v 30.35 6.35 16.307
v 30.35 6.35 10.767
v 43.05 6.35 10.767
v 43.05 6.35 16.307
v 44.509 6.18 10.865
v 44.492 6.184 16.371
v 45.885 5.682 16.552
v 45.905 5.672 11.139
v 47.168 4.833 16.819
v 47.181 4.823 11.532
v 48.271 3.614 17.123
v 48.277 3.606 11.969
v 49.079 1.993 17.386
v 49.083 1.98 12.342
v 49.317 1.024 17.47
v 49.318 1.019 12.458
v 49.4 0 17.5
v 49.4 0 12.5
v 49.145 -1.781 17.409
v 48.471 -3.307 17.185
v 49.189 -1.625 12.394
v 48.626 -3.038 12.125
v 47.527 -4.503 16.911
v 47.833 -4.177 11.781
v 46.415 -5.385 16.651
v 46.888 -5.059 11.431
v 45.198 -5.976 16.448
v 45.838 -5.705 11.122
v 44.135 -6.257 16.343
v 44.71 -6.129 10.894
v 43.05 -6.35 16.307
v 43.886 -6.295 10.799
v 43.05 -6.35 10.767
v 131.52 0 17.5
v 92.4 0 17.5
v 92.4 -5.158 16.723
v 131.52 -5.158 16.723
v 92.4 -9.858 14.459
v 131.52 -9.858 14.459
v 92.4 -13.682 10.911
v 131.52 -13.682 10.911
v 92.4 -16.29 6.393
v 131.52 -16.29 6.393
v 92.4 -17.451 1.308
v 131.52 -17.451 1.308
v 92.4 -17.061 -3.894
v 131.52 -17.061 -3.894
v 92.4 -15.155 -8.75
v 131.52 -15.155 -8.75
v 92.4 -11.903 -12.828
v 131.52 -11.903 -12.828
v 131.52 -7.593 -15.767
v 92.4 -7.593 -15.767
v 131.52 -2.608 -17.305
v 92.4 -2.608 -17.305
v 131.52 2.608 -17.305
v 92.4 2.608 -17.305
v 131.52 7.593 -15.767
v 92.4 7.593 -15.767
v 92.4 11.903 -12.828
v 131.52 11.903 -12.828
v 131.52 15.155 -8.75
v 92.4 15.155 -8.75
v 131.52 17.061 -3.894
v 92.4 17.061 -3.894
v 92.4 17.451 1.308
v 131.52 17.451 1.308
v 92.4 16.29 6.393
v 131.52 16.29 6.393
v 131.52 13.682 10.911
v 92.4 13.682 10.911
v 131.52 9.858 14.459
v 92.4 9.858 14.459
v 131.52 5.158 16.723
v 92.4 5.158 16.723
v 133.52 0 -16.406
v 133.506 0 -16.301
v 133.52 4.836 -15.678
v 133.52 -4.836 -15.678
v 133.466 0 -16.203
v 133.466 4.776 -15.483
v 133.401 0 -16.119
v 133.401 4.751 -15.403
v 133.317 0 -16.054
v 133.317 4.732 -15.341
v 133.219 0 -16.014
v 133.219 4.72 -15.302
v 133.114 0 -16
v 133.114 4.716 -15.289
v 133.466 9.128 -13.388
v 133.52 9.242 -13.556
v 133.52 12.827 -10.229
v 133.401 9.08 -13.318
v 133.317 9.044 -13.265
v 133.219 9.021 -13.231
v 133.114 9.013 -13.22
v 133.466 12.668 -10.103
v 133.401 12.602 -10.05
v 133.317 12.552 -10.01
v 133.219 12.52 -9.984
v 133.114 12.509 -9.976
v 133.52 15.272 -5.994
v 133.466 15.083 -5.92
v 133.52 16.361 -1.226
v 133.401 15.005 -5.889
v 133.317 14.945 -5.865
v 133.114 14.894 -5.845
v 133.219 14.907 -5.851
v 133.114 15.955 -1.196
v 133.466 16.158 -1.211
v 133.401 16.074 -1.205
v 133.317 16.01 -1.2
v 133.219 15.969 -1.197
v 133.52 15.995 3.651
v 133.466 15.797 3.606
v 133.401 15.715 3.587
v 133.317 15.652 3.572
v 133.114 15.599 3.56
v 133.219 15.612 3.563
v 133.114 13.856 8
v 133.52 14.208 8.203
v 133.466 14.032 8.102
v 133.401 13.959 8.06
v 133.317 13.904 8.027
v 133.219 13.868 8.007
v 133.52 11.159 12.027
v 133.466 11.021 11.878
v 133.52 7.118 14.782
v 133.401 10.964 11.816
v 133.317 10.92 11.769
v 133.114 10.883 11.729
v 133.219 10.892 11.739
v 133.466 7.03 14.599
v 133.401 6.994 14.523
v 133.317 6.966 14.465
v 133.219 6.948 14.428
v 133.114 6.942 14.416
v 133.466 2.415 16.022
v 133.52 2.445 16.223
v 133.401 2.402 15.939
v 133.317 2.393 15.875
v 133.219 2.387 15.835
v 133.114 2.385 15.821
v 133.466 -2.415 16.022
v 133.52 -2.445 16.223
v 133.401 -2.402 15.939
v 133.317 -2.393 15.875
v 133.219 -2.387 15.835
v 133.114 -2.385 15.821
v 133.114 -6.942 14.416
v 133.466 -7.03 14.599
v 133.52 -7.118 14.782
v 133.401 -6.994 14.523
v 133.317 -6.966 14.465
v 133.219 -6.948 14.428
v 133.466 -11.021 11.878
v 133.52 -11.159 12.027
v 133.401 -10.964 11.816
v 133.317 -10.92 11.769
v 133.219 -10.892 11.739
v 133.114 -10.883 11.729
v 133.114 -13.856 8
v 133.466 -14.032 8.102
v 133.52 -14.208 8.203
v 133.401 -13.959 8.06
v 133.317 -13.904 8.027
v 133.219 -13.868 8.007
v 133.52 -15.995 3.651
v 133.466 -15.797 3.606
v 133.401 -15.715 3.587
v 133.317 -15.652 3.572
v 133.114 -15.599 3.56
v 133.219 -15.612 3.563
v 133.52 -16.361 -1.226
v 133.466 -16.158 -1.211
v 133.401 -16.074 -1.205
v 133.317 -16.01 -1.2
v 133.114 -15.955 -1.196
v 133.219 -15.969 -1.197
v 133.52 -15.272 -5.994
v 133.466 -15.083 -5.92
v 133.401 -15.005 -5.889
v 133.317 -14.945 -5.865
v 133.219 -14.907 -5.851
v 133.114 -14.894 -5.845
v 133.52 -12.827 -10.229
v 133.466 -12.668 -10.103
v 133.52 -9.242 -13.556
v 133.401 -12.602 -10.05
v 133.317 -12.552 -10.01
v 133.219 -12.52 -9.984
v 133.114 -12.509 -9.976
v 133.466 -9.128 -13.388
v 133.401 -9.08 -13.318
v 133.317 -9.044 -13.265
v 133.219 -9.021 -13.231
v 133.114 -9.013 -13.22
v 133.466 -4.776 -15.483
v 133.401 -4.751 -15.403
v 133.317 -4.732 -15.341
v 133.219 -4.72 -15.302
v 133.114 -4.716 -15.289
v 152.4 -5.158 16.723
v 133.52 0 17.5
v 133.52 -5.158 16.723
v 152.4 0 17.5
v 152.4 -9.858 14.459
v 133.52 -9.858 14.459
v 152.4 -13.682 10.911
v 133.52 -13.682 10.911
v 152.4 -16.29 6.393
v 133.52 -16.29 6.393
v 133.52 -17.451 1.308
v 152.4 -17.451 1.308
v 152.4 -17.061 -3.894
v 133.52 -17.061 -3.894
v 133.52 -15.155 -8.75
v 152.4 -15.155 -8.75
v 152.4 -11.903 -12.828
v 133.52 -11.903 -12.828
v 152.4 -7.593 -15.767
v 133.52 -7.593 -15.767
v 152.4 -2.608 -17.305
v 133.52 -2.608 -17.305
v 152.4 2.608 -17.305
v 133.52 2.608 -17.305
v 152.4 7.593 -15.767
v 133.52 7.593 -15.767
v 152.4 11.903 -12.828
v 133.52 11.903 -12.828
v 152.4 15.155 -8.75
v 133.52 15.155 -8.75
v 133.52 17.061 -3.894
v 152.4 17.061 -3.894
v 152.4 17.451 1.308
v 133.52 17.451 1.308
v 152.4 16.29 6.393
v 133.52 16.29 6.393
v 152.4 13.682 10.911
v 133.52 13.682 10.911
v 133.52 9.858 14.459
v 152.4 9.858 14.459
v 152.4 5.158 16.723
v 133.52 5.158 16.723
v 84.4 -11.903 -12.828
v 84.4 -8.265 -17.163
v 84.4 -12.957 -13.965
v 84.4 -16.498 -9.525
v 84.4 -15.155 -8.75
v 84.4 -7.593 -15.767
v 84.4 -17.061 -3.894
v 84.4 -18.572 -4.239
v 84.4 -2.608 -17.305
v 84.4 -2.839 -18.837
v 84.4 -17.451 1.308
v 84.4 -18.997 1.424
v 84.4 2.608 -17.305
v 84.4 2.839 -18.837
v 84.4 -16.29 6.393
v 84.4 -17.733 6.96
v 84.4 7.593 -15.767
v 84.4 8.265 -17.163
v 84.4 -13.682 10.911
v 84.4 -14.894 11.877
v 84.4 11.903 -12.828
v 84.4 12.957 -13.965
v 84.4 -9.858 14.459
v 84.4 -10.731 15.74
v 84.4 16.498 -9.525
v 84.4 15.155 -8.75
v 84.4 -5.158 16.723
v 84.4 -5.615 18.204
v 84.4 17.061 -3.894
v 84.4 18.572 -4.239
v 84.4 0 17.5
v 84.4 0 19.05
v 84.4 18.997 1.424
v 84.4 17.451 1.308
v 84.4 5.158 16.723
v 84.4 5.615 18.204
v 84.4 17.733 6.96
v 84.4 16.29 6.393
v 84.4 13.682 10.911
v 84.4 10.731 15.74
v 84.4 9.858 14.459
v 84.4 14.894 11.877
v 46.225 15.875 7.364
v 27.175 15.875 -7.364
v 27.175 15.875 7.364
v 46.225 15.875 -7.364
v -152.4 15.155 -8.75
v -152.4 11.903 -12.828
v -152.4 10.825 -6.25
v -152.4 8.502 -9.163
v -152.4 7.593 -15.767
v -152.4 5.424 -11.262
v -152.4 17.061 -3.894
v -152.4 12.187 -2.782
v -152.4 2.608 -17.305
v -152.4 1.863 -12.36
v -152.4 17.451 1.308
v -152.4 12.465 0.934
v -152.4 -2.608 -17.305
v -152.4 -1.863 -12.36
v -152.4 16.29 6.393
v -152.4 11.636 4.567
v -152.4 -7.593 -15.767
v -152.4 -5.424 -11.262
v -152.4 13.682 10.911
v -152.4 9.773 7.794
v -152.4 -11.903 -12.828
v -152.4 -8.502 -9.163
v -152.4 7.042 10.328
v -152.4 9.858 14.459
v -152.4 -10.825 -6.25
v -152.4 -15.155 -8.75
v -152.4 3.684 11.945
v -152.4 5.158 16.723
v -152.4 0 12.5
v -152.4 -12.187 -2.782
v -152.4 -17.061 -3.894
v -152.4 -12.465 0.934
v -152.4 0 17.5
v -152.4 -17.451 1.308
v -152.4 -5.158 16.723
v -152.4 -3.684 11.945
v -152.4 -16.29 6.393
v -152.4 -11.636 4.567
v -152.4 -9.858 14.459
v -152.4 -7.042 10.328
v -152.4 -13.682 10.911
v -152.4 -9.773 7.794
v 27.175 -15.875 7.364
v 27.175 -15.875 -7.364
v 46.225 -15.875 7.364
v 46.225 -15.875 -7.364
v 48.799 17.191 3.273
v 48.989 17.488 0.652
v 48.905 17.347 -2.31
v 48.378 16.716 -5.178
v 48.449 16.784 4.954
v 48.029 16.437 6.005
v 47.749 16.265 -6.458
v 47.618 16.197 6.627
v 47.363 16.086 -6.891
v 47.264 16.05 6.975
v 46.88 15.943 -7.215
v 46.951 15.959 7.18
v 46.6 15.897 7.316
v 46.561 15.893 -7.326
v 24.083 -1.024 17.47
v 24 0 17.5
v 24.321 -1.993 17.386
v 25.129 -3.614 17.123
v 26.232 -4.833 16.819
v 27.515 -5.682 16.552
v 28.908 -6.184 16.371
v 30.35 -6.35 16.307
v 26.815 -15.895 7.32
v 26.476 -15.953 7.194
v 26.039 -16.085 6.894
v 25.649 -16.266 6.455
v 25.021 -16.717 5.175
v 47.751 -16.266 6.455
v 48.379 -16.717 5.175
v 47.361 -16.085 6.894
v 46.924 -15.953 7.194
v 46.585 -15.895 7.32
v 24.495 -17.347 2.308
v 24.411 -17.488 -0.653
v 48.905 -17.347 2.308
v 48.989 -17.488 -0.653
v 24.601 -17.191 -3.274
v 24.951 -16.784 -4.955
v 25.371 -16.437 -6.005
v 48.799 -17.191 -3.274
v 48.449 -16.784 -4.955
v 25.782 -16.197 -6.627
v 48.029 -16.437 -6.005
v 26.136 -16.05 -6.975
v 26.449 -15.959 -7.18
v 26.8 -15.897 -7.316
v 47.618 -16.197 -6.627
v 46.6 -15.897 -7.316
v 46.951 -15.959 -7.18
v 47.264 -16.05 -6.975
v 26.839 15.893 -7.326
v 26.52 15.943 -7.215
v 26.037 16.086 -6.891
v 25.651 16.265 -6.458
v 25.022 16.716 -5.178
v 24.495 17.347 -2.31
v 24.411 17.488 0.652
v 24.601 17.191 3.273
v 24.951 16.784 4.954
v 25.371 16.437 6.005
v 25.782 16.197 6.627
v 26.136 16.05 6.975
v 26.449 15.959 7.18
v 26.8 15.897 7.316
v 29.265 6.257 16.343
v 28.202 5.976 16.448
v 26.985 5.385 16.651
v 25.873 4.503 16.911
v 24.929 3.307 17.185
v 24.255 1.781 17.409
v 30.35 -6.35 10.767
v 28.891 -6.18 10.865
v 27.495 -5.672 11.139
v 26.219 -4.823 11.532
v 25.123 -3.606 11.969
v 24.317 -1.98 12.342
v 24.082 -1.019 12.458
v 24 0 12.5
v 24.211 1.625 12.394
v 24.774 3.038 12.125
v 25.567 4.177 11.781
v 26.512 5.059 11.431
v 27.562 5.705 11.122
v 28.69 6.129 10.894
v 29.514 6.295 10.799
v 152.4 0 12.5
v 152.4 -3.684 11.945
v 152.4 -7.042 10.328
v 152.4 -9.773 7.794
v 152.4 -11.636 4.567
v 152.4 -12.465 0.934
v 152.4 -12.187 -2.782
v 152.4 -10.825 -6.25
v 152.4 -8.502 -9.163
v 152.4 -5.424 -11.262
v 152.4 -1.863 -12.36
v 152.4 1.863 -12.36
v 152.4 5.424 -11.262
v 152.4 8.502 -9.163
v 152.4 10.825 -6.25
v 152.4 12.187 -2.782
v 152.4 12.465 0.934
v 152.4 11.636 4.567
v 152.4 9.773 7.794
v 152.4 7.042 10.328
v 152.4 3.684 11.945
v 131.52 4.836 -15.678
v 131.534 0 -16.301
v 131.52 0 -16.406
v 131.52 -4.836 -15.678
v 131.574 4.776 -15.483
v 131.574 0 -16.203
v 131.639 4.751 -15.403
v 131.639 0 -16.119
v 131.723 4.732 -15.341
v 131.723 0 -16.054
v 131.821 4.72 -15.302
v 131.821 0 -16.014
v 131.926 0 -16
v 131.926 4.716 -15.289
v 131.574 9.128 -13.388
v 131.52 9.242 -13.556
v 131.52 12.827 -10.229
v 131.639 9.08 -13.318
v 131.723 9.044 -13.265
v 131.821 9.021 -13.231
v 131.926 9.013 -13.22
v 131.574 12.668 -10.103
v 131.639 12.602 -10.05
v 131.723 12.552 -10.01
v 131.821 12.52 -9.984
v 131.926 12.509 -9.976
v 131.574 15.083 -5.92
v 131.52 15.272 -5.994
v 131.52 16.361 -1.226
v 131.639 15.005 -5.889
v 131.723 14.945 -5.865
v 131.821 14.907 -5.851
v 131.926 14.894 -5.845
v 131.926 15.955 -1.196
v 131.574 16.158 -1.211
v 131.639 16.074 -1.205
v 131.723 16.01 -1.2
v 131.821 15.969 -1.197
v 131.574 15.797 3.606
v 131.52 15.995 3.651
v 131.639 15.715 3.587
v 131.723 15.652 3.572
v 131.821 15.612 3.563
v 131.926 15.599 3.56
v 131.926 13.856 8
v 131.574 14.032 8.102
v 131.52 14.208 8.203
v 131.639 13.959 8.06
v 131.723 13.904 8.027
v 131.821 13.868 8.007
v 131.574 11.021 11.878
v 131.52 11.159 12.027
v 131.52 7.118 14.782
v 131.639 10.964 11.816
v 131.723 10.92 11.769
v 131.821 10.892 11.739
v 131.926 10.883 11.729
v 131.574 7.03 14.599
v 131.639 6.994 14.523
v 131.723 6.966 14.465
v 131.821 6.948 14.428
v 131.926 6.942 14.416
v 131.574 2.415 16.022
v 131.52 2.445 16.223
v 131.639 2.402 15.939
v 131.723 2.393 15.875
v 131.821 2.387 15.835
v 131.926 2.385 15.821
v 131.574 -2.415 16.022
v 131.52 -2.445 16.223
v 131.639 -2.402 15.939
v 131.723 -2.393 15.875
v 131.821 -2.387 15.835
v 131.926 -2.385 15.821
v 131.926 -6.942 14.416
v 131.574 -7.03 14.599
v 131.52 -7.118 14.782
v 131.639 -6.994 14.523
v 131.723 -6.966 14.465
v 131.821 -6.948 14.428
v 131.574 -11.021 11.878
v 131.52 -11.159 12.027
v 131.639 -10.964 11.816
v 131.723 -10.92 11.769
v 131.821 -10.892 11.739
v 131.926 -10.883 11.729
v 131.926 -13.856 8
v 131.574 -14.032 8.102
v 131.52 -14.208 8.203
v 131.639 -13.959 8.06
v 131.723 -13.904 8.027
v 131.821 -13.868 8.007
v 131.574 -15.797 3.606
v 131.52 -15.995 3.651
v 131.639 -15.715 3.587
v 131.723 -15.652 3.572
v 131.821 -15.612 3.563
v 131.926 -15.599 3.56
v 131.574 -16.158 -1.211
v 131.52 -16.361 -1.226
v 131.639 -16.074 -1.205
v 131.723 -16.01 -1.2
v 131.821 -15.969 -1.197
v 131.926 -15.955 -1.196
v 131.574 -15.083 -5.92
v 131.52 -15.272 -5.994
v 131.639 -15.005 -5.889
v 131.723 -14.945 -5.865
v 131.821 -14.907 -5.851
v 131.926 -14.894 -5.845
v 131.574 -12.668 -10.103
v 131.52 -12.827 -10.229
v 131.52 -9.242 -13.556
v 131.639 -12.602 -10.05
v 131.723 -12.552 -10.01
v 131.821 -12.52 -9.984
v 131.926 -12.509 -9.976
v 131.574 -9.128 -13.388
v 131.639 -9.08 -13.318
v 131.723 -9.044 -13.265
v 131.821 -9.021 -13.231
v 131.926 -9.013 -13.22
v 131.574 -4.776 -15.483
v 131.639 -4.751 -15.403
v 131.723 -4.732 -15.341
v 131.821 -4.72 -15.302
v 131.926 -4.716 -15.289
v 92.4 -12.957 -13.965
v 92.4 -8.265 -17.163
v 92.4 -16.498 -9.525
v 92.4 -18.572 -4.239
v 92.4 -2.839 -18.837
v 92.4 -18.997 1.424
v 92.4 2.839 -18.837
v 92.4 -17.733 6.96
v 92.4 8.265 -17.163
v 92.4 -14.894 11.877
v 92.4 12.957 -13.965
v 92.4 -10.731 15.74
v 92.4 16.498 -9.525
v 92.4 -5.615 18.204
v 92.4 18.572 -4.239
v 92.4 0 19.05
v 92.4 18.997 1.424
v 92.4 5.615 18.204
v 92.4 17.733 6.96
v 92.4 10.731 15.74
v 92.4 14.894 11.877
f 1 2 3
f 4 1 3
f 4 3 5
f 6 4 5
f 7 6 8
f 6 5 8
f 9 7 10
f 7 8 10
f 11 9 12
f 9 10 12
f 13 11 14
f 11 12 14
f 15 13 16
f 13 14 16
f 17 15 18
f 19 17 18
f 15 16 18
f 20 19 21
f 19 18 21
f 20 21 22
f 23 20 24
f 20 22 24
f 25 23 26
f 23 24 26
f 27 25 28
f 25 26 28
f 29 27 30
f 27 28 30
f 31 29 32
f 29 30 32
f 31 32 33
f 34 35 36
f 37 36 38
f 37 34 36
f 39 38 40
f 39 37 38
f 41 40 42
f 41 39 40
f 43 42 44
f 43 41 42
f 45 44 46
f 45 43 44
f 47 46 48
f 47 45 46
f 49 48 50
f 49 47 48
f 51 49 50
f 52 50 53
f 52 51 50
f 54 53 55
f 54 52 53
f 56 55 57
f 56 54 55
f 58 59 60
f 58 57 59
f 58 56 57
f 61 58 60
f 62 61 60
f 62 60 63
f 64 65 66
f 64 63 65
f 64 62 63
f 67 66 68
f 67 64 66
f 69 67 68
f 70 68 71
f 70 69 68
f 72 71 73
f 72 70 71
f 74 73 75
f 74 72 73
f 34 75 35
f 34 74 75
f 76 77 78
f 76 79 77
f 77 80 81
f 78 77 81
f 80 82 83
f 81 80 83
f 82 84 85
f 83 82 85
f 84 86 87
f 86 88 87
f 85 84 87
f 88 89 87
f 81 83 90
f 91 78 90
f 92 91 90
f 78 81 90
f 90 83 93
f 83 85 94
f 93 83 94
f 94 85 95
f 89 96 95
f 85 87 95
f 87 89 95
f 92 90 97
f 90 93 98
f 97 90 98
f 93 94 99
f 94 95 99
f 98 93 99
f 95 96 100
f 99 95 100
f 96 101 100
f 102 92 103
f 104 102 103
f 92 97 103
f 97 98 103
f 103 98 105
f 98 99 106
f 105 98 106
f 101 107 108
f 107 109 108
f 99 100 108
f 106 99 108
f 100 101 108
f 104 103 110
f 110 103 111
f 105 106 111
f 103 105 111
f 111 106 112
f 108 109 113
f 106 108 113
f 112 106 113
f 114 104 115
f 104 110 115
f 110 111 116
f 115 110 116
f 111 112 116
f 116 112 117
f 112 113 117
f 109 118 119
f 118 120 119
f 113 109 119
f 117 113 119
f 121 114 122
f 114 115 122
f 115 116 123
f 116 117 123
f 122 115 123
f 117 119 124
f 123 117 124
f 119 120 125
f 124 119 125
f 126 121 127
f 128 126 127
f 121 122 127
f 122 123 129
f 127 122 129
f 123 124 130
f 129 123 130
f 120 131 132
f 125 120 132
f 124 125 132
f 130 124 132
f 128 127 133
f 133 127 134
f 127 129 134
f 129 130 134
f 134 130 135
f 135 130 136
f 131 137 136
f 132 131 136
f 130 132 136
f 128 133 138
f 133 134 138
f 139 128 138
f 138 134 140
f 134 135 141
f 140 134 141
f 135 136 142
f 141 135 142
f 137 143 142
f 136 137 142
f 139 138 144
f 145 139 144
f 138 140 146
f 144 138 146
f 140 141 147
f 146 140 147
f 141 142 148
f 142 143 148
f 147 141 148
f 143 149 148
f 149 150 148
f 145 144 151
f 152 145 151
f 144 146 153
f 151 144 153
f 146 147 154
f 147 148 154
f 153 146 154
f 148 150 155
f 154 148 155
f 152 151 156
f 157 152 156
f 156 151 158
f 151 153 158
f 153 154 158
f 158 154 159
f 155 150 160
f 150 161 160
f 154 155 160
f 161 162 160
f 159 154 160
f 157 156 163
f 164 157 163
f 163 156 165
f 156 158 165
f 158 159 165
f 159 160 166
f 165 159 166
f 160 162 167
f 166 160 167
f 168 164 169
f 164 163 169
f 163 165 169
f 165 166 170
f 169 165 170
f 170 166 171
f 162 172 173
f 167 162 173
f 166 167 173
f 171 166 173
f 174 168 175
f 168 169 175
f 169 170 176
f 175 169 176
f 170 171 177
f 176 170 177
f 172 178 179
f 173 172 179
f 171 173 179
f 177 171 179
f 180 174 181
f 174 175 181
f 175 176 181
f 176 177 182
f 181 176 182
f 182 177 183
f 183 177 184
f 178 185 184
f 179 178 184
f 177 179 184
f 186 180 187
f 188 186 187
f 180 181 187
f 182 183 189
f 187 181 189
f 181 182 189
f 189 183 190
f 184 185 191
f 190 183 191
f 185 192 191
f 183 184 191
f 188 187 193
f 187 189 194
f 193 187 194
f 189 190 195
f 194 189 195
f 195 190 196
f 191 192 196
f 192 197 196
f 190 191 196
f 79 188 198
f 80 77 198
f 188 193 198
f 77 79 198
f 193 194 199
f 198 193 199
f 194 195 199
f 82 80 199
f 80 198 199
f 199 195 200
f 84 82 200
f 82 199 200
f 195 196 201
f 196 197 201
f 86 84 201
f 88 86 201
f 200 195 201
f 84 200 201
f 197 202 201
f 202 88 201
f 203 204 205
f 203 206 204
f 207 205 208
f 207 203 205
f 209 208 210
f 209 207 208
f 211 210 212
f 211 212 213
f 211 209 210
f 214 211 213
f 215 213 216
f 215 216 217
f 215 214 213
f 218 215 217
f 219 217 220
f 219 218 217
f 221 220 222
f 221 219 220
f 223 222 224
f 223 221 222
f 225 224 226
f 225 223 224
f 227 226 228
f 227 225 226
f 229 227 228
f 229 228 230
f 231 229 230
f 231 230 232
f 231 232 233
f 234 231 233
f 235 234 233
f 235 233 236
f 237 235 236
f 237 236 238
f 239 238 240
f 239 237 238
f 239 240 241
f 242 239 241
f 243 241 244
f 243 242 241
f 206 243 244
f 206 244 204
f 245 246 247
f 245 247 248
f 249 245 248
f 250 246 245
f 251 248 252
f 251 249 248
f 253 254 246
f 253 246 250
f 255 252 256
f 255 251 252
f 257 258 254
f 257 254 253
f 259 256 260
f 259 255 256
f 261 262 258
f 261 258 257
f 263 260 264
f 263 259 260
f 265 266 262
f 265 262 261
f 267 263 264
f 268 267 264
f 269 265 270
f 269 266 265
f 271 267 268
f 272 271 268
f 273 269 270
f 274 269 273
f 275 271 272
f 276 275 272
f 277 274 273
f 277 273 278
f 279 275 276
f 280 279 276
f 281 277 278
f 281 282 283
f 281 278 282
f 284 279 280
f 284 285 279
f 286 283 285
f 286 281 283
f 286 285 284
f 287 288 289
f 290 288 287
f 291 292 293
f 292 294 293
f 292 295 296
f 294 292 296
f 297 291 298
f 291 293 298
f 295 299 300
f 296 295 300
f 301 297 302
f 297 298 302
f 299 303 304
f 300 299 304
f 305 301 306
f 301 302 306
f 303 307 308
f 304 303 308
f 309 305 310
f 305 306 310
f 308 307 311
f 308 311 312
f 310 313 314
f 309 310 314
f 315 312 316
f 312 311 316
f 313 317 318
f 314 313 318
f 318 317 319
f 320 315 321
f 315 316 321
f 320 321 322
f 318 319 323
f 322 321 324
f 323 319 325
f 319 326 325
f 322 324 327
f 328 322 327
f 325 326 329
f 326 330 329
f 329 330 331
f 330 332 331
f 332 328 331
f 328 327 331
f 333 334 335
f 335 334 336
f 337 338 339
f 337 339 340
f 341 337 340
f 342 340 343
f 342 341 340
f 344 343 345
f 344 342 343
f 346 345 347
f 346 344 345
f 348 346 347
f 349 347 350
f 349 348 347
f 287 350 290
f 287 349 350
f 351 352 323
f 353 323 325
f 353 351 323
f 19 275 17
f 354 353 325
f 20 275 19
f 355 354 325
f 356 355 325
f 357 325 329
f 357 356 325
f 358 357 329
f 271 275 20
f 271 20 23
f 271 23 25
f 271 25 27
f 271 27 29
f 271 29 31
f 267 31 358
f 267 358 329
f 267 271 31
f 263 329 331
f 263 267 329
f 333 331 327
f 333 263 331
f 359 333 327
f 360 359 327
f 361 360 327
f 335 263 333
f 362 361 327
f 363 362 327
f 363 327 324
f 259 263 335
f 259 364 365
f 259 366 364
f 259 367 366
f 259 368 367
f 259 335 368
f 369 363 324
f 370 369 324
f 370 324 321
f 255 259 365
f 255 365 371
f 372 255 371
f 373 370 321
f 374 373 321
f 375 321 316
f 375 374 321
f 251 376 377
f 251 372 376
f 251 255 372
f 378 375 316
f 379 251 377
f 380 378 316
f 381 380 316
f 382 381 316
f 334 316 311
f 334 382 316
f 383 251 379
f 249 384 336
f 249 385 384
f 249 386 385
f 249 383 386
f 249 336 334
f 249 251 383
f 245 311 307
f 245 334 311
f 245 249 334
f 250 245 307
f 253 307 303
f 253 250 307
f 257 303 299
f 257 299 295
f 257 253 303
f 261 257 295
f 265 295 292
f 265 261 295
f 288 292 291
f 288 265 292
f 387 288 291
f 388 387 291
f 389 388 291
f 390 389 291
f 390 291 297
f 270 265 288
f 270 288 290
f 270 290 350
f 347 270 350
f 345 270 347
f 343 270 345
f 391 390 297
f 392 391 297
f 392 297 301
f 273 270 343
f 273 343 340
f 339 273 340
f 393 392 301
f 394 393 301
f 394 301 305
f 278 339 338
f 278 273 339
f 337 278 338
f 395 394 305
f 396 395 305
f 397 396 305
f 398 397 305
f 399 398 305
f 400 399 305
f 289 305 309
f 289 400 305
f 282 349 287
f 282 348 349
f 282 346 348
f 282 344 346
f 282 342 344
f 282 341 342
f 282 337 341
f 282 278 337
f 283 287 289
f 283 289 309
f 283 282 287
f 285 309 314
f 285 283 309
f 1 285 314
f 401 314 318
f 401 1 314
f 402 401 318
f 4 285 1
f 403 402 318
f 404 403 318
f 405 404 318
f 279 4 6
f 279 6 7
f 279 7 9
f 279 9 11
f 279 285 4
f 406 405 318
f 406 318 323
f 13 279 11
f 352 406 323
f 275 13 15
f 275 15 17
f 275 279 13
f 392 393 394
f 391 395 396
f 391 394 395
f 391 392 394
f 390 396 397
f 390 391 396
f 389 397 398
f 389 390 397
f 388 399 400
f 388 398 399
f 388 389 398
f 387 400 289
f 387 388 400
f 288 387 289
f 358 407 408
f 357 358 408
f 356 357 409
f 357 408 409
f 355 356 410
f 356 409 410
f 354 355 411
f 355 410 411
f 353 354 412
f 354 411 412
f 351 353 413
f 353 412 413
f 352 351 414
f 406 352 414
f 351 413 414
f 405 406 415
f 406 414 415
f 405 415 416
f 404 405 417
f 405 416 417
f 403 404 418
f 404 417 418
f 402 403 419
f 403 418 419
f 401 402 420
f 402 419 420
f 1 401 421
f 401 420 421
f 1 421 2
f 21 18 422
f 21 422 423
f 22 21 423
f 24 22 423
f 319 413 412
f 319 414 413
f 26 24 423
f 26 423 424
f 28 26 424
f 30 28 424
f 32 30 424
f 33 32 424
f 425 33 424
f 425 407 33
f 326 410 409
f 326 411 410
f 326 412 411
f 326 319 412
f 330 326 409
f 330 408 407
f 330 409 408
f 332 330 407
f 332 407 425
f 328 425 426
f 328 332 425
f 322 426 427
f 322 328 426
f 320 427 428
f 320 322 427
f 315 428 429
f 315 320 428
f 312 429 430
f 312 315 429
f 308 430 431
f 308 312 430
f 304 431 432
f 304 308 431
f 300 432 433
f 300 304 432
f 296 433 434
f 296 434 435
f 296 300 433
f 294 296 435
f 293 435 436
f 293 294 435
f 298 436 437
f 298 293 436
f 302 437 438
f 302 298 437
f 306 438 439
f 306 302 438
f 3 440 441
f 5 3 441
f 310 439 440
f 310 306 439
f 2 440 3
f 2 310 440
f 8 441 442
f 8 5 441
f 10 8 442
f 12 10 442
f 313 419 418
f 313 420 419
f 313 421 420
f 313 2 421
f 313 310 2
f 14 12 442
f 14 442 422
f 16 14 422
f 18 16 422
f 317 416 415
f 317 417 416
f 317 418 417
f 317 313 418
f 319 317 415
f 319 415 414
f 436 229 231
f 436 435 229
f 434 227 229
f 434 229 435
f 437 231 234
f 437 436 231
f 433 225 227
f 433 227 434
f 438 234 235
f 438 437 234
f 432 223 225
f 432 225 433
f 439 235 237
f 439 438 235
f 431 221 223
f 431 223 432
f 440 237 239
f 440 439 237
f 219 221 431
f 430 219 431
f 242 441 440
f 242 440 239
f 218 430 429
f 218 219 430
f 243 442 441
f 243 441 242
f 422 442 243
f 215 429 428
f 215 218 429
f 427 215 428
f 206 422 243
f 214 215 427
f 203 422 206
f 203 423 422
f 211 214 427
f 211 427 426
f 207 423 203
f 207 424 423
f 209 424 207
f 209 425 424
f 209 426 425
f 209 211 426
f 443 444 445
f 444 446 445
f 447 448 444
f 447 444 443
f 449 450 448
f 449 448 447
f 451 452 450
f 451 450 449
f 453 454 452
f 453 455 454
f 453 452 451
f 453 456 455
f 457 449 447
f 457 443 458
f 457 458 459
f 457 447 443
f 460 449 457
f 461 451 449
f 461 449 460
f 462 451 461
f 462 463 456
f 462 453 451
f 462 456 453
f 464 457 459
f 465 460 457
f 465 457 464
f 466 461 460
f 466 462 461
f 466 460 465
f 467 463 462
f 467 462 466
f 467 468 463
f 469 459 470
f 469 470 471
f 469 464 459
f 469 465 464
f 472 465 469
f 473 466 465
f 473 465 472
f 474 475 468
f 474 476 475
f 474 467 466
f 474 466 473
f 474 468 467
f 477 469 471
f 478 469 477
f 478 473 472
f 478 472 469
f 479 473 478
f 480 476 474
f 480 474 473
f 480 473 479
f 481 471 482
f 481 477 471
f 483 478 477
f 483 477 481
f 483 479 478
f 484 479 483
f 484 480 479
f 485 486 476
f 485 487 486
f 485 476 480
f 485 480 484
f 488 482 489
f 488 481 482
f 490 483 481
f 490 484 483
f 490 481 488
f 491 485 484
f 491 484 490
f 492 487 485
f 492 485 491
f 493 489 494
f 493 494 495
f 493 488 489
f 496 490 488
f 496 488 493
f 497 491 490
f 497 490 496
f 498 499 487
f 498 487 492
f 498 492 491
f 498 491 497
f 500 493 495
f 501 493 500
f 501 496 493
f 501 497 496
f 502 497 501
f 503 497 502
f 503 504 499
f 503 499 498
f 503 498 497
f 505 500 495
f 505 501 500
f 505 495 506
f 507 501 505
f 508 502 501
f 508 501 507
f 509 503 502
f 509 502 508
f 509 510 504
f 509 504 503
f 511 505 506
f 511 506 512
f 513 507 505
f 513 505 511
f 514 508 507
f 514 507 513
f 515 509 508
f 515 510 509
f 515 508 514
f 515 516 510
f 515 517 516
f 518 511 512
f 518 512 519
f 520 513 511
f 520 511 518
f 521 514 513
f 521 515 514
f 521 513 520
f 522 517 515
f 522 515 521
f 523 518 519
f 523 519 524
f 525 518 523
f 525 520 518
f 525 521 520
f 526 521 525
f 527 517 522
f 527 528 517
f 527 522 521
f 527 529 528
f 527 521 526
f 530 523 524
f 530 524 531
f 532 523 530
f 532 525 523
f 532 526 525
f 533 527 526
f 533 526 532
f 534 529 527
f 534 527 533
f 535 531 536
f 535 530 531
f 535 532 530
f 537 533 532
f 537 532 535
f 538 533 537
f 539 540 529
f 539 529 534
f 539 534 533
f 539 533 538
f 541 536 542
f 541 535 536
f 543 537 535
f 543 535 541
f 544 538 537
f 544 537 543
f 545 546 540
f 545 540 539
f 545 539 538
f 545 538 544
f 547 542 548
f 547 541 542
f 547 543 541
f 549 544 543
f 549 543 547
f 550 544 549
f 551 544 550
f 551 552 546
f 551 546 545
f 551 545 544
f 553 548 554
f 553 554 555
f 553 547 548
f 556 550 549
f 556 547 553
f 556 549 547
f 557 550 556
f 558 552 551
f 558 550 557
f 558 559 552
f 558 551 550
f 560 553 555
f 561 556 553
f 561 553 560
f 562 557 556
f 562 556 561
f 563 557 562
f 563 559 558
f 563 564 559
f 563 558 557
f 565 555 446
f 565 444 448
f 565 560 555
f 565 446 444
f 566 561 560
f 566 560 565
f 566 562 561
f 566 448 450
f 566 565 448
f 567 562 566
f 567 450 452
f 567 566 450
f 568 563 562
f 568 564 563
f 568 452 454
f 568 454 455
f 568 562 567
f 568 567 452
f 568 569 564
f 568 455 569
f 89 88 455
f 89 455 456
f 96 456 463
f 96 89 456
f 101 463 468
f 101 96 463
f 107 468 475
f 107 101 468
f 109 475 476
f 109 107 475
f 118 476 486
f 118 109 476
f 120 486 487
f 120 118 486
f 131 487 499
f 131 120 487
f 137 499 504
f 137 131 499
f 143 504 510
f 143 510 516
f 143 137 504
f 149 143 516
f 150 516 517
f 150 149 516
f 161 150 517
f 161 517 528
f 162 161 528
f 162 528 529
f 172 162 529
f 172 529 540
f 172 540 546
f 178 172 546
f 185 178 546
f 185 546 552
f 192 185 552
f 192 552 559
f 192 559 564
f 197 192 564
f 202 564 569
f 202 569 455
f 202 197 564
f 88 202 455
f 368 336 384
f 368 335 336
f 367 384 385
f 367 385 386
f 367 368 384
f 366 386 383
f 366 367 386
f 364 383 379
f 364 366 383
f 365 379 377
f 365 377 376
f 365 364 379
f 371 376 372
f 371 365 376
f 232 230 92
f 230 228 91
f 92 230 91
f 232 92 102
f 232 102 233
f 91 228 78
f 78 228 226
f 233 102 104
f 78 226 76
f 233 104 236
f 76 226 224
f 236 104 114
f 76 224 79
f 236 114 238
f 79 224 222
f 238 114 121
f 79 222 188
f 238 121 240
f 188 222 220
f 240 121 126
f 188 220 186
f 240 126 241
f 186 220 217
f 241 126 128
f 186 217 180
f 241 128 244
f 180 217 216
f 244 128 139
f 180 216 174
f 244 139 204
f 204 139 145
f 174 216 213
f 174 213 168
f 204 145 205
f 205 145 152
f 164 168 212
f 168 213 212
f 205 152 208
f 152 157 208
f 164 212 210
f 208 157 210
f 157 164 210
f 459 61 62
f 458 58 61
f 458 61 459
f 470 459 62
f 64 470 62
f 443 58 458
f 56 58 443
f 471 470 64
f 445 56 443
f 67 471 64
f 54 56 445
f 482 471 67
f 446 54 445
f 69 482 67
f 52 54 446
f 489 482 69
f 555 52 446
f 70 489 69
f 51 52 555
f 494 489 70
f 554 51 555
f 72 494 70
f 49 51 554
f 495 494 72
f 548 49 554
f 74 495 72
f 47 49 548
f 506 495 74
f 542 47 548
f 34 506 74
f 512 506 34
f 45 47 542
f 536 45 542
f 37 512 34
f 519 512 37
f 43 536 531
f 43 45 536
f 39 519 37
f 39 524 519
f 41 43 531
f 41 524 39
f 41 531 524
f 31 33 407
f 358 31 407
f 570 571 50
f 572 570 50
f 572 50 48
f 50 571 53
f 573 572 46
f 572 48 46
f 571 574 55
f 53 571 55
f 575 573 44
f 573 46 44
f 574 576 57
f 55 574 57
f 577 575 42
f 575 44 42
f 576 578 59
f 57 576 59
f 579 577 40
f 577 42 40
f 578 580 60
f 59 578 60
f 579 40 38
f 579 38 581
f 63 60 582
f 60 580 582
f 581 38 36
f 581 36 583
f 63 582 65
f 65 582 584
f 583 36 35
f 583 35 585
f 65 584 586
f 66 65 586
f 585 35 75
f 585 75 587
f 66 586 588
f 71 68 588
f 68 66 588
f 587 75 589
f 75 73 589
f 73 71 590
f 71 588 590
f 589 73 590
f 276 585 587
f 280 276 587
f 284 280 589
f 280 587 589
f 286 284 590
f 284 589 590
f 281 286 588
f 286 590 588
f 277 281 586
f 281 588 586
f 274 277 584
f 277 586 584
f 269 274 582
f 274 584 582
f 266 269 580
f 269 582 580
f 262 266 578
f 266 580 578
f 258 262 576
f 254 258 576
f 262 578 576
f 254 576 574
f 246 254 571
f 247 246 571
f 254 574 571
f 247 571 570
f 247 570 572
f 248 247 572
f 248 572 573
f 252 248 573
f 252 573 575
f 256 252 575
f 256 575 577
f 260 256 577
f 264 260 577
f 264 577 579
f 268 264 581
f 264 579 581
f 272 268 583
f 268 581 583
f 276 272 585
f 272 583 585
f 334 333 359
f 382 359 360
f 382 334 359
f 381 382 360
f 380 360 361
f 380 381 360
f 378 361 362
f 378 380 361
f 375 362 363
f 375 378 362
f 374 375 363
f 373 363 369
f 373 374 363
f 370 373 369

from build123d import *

# Parameters (mm, degrees)
SKETCH1_R               = 17.5
SKETCH1_R_2             = 12.5
BOSS_EXTRUDE1_DEPTH     = 152.4
SKETCH2_R               = 19.05
SKETCH2_R_2             = 17.5
BOSS_EXTRUDE2_DEPTH     = 8
SKETCH4_R               = 17.5
SKETCH4_R_2             = 16
CUT_EXTRUDE2_DEPTH      = 2
FILLET1_R               = 0.4064
CUT_EXTRUDE3_DEPTH      = 155.762931608
CUT_EXTRUDE3_DEPTH_BACK = 155.762931608
SKETCH8_W               = 25.4
SKETCH8_H               = 3.175
FILLET2_R               = 3.175
CUT_EXTRUDE4_REACH      = 156.763
CUT_EXTRUDE4_END_RADIUS = 17.5


with BuildPart() as part:
    # Sketch1 → Boss-Extrude1 (new, symmetric)
    with BuildSketch(Plane(origin=(0, 0, 0), x_dir=(0, 0, -1), z_dir=(1, 0, 0))):
        with Locations(Location((0, 0, 0), (0, 0, 180))):
            Circle(SKETCH1_R)
        with Locations(Location((0, 0, 0), (0, 0, 180))):
            Circle(SKETCH1_R_2, mode=Mode.SUBTRACT)
    extrude(amount=BOSS_EXTRUDE1_DEPTH, both=True)

    # Sketch2 → Boss-Extrude2 (add)
    with BuildSketch(Plane.ZY.offset(-92.4)):
        Circle(SKETCH2_R)
        Circle(SKETCH2_R_2, mode=Mode.SUBTRACT)
    extrude(amount=BOSS_EXTRUDE2_DEPTH)

    # Sketch4 → Cut-Extrude2 (cut)
    with BuildSketch(Plane(origin=(133.52, 0, 0), x_dir=(0, 0, -1), z_dir=(1, 0, 0))):
        with Locations(Location((0, 0, 0), (0, 0, 180))):
            Circle(SKETCH4_R)
        Circle(SKETCH4_R_2, mode=Mode.SUBTRACT)
    extrude(amount=-CUT_EXTRUDE2_DEPTH, mode=Mode.SUBTRACT)

    # Fillet1
    fillet1_edges = [part.edges().sort_by_distance(p)[0] for p in [
        (131.52, 0, 16),
        (133.52, 0, 16),
    ]]
    fillet(fillet1_edges, radius=FILLET1_R)

    # Sketch8 → Cut-Extrude3 (cut, two sides: drawn at the far end of the back side and taken through both)
    with BuildSketch(Plane.XY.offset(-CUT_EXTRUDE3_DEPTH_BACK)):
        with Locations((36.7, 17.4625)):
            Rectangle(SKETCH8_W, SKETCH8_H)
        with Locations((36.7, -17.4625)):
            Rectangle(SKETCH8_W, SKETCH8_H)
    extrude(amount=CUT_EXTRUDE3_DEPTH + CUT_EXTRUDE3_DEPTH_BACK, mode=Mode.SUBTRACT)

    # Fillet2
    # the kernel refuses this fillet: 3.175 mm, written as the material it adds along each edge
    with BuildSketch(Plane(origin=(49.4, -15.875, 15.301899161), x_dir=(-1, 0, 0), z_dir=(0, 0, -1))) as fillet2_piece_1_section:
        with BuildLine():
            CenterArc((FILLET2_R, -FILLET2_R), FILLET2_R, 90, 90)
            Line((0, -FILLET2_R), (0, 0))
            Line((0, 0), (FILLET2_R, 0))
        make_face()
    fillet2_piece_1 = extrude(amount=30.603798322, mode=Mode.PRIVATE)
    fillet2_piece_1 = fillet2_piece_1 & Plane(origin=(48.505622485, 0, 0), x_dir=(0, 0, 1), z_dir=(1, 0, 0)) * Cylinder(17.5, 74, mode=Mode.PRIVATE)
    add(fillet2_piece_1)
    with BuildSketch(Plane(origin=(24, -15.875, -15.301899161), x_dir=(1, 0, 0), z_dir=(0, 0, 1))) as fillet2_piece_2_section:
        with BuildLine():
            CenterArc((FILLET2_R, -FILLET2_R), FILLET2_R, 90, 90)
            Line((0, -FILLET2_R), (0, 0))
            Line((0, 0), (FILLET2_R, 0))
        make_face()
    fillet2_piece_2 = extrude(amount=30.603798322, mode=Mode.PRIVATE)
    fillet2_piece_2 = fillet2_piece_2 & Plane(origin=(24.894377515, 0, 0), x_dir=(0, 0, 1), z_dir=(1, 0, 0)) * Cylinder(17.5, 74, mode=Mode.PRIVATE)
    add(fillet2_piece_2)
    with BuildSketch(Plane(origin=(49.4, 15.875, 15.301899161), x_dir=(-1, 0, 0), z_dir=(0, 0, -1))) as fillet2_piece_3_section:
        with BuildLine():
            CenterArc((FILLET2_R, FILLET2_R), FILLET2_R, 180, 90)
            Line((0, FILLET2_R), (0, 0))
            Line((0, 0), (FILLET2_R, 0))
        make_face()
    fillet2_piece_3 = extrude(amount=30.603798322, mode=Mode.PRIVATE)
    fillet2_piece_3 = fillet2_piece_3 & Plane(origin=(48.50564536, 0, 0), x_dir=(0, 0, 1), z_dir=(1, 0, 0)) * Cylinder(17.5, 74, mode=Mode.PRIVATE)
    add(fillet2_piece_3)
    with BuildSketch(Plane(origin=(24, 15.875, -15.301899161), x_dir=(0, 1, 0), z_dir=(0, 0, 1))) as fillet2_piece_4_section:
        with BuildLine():
            CenterArc((FILLET2_R, -FILLET2_R), FILLET2_R, 90, 90)
            Line((0, -FILLET2_R), (0, 0))
            Line((0, 0), (FILLET2_R, 0))
        make_face()
    fillet2_piece_4 = extrude(amount=30.603798322, mode=Mode.PRIVATE)
    fillet2_piece_4 = fillet2_piece_4 & Plane(origin=(24.89438719, 0, 0), x_dir=(0, 0, 1), z_dir=(1, 0, 0)) * Cylinder(17.5, 74, mode=Mode.PRIVATE)
    add(fillet2_piece_4)

    # Cut-Extrude4: up to this cylinder (the profile starts inside it)
    cut_extrude4_end = Plane(origin=(36.7, 0, 0), z_dir=(-1, 0, 0)) * Cylinder(CUT_EXTRUDE4_END_RADIUS, 349.526, mode=Mode.PRIVATE)
    # Sketch9 → Cut-Extrude4 (cut, up to the surface)
    with BuildSketch(Plane.XY, mode=Mode.PRIVATE) as cut_extrude4_sk1:
        with BuildLine():
            Line((43.05, -6.35), (30.35, -6.35))
            ThreePointArc((30.35, -6.35), (24, 0), (30.35, 6.35))
            Line((30.35, 6.35), (43.05, 6.35))
            ThreePointArc((43.05, 6.35), (49.4, 0), (43.05, -6.35))
        make_face()
    cut_extrude4_tool1 = extrude(cut_extrude4_sk1.sketch, amount=CUT_EXTRUDE4_REACH, mode=Mode.PRIVATE) & cut_extrude4_end
    add(cut_extrude4_tool1.solids().sort_by_distance((36.7, 0, 0))[0], mode=Mode.SUBTRACT)


solid = part.part
